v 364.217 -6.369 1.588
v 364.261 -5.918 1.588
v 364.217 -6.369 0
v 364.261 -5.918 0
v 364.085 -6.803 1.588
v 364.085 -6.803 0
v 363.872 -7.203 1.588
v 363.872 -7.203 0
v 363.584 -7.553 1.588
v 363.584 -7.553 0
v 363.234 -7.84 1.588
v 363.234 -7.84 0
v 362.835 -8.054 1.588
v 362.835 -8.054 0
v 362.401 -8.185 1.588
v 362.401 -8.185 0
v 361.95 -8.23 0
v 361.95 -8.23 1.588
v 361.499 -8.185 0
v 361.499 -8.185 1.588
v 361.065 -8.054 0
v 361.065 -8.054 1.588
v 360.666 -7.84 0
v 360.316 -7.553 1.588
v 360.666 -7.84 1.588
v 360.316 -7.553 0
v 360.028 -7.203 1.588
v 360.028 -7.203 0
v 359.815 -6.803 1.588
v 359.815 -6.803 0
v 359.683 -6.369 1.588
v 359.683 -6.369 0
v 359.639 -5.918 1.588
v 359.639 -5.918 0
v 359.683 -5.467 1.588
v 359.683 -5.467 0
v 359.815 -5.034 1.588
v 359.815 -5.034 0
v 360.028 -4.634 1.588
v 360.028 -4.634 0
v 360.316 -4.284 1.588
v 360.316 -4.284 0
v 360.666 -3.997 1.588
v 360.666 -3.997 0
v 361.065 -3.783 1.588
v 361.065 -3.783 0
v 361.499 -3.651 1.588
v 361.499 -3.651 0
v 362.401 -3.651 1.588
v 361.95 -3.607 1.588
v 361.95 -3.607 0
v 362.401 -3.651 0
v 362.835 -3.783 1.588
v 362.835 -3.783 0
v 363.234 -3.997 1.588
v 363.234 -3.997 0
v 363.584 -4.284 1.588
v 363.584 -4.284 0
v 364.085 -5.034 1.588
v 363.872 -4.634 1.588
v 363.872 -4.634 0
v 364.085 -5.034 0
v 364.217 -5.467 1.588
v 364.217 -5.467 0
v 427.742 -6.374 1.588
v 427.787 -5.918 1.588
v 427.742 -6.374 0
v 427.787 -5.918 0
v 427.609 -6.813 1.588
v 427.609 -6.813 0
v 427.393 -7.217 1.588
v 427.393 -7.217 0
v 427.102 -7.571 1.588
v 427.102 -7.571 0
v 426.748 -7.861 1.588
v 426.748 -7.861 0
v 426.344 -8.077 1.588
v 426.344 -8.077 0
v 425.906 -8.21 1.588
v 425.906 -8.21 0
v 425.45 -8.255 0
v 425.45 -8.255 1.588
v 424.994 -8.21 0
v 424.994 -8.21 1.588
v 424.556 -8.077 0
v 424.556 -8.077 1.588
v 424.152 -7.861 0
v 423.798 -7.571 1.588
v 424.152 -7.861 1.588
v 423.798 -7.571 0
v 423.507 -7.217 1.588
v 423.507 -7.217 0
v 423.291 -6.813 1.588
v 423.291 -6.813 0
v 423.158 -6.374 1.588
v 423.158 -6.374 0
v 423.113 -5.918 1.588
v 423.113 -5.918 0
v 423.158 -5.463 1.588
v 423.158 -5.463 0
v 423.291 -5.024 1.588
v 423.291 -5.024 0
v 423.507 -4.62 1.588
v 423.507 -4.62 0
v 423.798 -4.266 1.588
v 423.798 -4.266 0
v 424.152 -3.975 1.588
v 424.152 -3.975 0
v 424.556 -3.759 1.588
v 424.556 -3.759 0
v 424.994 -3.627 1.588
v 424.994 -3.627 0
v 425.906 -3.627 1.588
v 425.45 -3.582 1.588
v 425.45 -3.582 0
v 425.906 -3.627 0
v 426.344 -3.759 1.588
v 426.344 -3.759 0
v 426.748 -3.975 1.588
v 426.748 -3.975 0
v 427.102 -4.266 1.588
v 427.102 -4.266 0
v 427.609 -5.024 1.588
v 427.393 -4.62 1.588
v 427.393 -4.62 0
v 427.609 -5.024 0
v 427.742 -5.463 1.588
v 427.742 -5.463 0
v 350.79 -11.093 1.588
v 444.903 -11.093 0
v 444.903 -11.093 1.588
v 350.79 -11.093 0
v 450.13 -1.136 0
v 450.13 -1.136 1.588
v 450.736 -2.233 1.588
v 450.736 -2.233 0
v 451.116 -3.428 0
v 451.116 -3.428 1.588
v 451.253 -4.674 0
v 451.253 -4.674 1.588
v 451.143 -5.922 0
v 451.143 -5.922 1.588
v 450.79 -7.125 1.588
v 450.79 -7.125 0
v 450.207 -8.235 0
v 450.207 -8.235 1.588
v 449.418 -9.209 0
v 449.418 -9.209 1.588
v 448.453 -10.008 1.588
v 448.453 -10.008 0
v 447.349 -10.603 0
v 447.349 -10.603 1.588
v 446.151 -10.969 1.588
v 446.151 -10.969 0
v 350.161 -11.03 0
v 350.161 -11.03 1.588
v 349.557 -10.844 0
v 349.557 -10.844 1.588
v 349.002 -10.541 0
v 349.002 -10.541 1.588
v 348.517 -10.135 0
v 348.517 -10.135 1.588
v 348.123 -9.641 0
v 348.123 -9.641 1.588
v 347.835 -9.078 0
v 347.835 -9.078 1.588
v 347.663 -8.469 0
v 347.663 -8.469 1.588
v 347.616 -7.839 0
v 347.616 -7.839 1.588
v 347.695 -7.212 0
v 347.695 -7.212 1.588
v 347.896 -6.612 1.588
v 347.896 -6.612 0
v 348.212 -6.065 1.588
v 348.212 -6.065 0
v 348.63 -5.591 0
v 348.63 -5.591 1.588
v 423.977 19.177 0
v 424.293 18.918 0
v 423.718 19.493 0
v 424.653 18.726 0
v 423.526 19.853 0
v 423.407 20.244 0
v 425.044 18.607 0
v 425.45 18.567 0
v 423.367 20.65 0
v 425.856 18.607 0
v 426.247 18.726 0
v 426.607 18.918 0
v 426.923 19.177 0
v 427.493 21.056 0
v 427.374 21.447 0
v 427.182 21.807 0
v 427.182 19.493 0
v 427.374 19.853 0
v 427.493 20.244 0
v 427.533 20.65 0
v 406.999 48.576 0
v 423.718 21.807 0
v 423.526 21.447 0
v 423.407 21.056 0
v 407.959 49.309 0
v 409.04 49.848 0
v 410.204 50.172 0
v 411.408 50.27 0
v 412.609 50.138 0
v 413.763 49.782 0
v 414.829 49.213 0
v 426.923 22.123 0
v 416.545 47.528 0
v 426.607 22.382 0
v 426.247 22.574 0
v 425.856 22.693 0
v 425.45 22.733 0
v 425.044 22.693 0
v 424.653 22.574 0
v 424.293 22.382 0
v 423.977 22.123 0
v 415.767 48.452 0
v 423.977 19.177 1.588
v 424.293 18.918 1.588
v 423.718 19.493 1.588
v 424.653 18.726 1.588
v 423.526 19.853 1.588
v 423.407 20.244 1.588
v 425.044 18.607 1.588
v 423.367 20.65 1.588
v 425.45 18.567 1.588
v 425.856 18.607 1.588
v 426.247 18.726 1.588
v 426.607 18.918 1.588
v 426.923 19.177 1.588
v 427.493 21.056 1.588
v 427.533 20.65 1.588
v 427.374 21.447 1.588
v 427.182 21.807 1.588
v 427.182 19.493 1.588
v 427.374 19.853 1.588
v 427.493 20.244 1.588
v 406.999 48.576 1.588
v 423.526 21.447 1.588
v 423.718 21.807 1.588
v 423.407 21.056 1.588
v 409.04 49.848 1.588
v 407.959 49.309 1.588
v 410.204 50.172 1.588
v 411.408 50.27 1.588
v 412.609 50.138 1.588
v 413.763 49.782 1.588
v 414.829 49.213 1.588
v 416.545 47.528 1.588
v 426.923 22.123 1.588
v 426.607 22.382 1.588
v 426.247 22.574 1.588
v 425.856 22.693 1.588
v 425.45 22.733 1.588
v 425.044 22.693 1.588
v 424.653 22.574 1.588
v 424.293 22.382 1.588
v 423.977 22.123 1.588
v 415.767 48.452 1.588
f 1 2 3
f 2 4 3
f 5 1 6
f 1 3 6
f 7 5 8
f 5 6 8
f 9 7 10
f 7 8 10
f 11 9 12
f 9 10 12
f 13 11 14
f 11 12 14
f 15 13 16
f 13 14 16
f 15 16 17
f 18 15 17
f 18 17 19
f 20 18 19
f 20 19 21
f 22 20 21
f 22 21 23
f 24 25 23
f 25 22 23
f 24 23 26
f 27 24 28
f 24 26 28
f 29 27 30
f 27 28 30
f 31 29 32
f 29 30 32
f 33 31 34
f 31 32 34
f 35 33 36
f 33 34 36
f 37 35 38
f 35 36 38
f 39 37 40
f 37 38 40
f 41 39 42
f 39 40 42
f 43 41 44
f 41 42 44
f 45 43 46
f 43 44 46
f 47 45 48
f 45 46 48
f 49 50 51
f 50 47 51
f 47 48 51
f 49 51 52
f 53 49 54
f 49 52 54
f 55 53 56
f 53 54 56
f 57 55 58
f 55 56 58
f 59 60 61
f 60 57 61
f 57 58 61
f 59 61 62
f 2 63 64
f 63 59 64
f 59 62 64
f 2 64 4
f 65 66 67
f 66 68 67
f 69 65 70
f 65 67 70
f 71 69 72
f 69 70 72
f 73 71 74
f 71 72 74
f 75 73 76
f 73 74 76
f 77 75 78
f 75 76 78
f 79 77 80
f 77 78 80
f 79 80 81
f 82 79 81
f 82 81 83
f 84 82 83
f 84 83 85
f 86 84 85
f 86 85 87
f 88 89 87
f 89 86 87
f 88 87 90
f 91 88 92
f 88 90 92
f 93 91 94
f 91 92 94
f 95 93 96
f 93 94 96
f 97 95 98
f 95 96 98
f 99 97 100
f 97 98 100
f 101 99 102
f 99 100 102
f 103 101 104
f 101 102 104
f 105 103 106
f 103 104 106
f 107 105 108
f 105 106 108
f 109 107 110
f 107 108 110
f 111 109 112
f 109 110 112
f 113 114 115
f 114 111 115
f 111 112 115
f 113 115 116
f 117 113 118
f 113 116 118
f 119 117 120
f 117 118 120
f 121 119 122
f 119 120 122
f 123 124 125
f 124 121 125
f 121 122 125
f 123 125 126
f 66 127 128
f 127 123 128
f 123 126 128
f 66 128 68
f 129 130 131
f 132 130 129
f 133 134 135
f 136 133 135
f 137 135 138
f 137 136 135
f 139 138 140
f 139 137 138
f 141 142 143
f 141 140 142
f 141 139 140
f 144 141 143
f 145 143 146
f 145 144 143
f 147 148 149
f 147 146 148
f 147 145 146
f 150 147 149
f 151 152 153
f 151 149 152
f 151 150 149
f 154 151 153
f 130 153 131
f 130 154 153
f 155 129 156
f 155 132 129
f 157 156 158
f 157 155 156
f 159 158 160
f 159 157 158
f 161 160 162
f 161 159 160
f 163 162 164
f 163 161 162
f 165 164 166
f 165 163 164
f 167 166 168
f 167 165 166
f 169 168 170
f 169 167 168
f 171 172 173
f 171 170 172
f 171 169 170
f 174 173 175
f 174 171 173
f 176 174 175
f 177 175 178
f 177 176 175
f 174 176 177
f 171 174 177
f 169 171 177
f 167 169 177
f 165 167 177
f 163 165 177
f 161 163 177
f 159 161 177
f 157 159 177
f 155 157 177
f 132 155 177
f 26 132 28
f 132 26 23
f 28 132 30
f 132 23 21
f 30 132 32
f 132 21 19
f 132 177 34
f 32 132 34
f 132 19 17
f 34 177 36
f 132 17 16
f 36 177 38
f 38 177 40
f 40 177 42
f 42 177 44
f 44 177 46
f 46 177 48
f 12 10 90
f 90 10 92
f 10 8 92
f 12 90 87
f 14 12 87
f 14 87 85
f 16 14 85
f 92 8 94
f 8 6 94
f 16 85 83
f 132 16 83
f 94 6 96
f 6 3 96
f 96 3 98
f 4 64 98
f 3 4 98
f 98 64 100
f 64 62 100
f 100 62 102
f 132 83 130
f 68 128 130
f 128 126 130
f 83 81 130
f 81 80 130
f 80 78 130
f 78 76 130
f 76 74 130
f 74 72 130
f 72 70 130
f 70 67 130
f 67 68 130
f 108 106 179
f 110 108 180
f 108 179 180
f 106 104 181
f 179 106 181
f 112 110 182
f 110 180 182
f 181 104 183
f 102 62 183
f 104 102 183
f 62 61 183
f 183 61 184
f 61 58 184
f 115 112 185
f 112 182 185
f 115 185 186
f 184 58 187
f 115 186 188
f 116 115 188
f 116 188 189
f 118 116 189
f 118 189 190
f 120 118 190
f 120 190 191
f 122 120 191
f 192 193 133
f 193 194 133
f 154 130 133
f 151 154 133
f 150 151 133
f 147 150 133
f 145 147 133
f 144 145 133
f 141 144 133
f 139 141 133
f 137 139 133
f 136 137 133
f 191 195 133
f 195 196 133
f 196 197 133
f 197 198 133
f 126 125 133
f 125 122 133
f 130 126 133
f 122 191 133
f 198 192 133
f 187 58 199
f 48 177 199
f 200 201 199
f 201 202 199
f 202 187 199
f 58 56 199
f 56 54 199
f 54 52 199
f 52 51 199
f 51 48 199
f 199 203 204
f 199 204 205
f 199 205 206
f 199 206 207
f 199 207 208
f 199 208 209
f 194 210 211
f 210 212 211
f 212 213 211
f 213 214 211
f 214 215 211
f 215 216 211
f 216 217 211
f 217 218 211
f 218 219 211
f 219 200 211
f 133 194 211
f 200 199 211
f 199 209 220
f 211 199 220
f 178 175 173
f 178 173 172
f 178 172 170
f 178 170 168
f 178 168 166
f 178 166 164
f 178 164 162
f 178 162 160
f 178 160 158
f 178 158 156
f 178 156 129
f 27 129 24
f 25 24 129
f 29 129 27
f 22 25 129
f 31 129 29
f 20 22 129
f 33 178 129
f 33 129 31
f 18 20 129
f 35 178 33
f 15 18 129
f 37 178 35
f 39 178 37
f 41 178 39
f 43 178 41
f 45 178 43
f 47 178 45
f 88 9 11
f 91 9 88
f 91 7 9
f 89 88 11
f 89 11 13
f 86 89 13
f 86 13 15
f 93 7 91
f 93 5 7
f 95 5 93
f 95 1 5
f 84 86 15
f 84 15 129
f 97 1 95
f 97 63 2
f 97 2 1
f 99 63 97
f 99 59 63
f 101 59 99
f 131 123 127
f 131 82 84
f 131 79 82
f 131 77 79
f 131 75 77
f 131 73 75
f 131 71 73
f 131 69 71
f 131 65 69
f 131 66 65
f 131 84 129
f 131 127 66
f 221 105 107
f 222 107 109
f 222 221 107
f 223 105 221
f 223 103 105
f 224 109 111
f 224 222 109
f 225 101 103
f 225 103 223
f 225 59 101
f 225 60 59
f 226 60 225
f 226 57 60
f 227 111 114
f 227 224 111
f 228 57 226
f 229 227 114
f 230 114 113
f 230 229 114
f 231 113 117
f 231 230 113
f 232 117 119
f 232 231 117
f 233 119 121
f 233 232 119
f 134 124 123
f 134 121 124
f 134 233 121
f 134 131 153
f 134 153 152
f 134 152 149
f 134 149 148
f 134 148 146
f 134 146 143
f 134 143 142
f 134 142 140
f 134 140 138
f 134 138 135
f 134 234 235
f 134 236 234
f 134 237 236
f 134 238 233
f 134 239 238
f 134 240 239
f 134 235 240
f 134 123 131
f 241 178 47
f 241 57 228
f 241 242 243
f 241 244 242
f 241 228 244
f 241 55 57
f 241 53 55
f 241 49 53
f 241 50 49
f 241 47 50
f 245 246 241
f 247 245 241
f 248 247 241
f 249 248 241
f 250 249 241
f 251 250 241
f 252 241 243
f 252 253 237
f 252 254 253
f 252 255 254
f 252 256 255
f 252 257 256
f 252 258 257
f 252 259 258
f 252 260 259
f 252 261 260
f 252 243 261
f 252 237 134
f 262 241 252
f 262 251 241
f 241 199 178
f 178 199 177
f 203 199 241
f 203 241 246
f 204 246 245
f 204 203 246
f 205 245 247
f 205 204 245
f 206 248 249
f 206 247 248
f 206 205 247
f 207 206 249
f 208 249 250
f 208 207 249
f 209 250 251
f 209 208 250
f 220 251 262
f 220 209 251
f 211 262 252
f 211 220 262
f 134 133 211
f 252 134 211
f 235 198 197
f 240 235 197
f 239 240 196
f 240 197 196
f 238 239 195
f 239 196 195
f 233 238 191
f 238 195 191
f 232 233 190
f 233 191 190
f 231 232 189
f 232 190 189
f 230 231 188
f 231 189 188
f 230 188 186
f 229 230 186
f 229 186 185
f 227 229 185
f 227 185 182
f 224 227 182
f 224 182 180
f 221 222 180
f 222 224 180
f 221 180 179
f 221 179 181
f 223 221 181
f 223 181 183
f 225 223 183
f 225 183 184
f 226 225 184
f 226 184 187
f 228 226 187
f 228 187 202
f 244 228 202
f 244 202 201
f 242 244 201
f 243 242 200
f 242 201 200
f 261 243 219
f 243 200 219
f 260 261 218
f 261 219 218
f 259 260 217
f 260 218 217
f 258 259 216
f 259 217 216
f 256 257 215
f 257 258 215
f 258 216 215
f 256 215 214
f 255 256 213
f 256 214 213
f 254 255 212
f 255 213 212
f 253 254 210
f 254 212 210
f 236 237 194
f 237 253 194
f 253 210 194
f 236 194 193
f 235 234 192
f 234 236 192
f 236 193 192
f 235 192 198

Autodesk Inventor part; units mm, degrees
ref_plane "YZ Plane" through (0, 0, 0) normal (1, 0, 0) x (0, 1, 0)
ref_plane "XZ Plane" through (0, 0, 0) normal (0, 1, 0) x (-1, 0, 0)
ref_plane "XY Plane" through (0, 0, 0) normal (0, 0, 1) x (1, 0, 0)
sketch "Sketch1" plane through (0, 0, 0) normal (0, 0, 1) x (1, 0, 0)
  circle A0 centre (425.45, 20.65) radius 2.0828 projected
  circle A1 centre (425.45, 20.65) radius 34.925 construction
  line L0 (425.45, 55.575) -> (298.45, 55.575) construction
  line L1 (323.85, 55.575) -> (323.85, 42.875) construction
  circle A2 centre (323.85, 12.649) radius 30.226 construction
  circle A3 centre (425.45, 20.65) radius 33.02 construction
  line L2 (406.9994, 48.5755) -> (348.6303, -5.5907)
  line L3 (420.1242, 27) -> (481.5758, 27) projected
  line L4 (442.214, -11.1) -> (383.027, -11.1) projected
  line L5 (450.1296, -1.1362) -> (416.5451, 47.5277)
  circle A4 centre (425.45, 20.65) radius 7.9375 construction
  arc A5 (416.5451, 47.5277) -> (406.9994, 48.5755) centre (411.3189, 43.9209) ccw
  line L6 (444.9034, -11.093) -> (350.7901, -11.093)
  line L7 (457.0011, -11.093) -> (551.1145, -11.093) construction
  arc A6 (444.9034, -11.093) -> (450.1296, -1.1362) centre (444.9034, -4.743) ccw
  arc A7 (348.6303, -5.5907) -> (350.7901, -11.093) centre (350.7901, -7.918) ccw
  circle A8 centre (387.35, -5.9184) radius 2.3114 projected
  circle A9 centre (361.95, -5.9184) radius 2.3114 projected
  circle A10 centre (438.15, -5.9184) radius 2.3114 projected
  circle A11 centre (425.45, -5.9184) radius 2.3368
  point P0 (0, 0)
  point P1 (342.7011, -11.093)
  dimension "d0" = 69.85
  dimension "d1" = 127
  dimension "d2" = 12.7
  dimension "d3" = 60.452
  dimension "d4" = 30.226
  dimension "d5" = 101.6
  dimension "d6" = 66.04
  dimension "d9" = 15.875
  dimension "d10" = 6.35
  dimension "d11" = 180
  dimension "d12" = 114.3
  dimension "d13" = 6.35
  dimension "d14" = 3.175
  dimension "d15" = 5.1746
  dimension "d16" = 101.6
  dimension "d19" = 4.6736
  dimension "d20" = 12.7
extrude "Extrusion1" add sketch "Sketch1" along normal blind 1.5875 contours A5 L5 A6 L6 A7 L2 | A8 | A10 | A11
extrude "Extrusion2" cut sketch "Sketch1" along normal blind 1.5875 contours A11
properties part number "tangentsled"
